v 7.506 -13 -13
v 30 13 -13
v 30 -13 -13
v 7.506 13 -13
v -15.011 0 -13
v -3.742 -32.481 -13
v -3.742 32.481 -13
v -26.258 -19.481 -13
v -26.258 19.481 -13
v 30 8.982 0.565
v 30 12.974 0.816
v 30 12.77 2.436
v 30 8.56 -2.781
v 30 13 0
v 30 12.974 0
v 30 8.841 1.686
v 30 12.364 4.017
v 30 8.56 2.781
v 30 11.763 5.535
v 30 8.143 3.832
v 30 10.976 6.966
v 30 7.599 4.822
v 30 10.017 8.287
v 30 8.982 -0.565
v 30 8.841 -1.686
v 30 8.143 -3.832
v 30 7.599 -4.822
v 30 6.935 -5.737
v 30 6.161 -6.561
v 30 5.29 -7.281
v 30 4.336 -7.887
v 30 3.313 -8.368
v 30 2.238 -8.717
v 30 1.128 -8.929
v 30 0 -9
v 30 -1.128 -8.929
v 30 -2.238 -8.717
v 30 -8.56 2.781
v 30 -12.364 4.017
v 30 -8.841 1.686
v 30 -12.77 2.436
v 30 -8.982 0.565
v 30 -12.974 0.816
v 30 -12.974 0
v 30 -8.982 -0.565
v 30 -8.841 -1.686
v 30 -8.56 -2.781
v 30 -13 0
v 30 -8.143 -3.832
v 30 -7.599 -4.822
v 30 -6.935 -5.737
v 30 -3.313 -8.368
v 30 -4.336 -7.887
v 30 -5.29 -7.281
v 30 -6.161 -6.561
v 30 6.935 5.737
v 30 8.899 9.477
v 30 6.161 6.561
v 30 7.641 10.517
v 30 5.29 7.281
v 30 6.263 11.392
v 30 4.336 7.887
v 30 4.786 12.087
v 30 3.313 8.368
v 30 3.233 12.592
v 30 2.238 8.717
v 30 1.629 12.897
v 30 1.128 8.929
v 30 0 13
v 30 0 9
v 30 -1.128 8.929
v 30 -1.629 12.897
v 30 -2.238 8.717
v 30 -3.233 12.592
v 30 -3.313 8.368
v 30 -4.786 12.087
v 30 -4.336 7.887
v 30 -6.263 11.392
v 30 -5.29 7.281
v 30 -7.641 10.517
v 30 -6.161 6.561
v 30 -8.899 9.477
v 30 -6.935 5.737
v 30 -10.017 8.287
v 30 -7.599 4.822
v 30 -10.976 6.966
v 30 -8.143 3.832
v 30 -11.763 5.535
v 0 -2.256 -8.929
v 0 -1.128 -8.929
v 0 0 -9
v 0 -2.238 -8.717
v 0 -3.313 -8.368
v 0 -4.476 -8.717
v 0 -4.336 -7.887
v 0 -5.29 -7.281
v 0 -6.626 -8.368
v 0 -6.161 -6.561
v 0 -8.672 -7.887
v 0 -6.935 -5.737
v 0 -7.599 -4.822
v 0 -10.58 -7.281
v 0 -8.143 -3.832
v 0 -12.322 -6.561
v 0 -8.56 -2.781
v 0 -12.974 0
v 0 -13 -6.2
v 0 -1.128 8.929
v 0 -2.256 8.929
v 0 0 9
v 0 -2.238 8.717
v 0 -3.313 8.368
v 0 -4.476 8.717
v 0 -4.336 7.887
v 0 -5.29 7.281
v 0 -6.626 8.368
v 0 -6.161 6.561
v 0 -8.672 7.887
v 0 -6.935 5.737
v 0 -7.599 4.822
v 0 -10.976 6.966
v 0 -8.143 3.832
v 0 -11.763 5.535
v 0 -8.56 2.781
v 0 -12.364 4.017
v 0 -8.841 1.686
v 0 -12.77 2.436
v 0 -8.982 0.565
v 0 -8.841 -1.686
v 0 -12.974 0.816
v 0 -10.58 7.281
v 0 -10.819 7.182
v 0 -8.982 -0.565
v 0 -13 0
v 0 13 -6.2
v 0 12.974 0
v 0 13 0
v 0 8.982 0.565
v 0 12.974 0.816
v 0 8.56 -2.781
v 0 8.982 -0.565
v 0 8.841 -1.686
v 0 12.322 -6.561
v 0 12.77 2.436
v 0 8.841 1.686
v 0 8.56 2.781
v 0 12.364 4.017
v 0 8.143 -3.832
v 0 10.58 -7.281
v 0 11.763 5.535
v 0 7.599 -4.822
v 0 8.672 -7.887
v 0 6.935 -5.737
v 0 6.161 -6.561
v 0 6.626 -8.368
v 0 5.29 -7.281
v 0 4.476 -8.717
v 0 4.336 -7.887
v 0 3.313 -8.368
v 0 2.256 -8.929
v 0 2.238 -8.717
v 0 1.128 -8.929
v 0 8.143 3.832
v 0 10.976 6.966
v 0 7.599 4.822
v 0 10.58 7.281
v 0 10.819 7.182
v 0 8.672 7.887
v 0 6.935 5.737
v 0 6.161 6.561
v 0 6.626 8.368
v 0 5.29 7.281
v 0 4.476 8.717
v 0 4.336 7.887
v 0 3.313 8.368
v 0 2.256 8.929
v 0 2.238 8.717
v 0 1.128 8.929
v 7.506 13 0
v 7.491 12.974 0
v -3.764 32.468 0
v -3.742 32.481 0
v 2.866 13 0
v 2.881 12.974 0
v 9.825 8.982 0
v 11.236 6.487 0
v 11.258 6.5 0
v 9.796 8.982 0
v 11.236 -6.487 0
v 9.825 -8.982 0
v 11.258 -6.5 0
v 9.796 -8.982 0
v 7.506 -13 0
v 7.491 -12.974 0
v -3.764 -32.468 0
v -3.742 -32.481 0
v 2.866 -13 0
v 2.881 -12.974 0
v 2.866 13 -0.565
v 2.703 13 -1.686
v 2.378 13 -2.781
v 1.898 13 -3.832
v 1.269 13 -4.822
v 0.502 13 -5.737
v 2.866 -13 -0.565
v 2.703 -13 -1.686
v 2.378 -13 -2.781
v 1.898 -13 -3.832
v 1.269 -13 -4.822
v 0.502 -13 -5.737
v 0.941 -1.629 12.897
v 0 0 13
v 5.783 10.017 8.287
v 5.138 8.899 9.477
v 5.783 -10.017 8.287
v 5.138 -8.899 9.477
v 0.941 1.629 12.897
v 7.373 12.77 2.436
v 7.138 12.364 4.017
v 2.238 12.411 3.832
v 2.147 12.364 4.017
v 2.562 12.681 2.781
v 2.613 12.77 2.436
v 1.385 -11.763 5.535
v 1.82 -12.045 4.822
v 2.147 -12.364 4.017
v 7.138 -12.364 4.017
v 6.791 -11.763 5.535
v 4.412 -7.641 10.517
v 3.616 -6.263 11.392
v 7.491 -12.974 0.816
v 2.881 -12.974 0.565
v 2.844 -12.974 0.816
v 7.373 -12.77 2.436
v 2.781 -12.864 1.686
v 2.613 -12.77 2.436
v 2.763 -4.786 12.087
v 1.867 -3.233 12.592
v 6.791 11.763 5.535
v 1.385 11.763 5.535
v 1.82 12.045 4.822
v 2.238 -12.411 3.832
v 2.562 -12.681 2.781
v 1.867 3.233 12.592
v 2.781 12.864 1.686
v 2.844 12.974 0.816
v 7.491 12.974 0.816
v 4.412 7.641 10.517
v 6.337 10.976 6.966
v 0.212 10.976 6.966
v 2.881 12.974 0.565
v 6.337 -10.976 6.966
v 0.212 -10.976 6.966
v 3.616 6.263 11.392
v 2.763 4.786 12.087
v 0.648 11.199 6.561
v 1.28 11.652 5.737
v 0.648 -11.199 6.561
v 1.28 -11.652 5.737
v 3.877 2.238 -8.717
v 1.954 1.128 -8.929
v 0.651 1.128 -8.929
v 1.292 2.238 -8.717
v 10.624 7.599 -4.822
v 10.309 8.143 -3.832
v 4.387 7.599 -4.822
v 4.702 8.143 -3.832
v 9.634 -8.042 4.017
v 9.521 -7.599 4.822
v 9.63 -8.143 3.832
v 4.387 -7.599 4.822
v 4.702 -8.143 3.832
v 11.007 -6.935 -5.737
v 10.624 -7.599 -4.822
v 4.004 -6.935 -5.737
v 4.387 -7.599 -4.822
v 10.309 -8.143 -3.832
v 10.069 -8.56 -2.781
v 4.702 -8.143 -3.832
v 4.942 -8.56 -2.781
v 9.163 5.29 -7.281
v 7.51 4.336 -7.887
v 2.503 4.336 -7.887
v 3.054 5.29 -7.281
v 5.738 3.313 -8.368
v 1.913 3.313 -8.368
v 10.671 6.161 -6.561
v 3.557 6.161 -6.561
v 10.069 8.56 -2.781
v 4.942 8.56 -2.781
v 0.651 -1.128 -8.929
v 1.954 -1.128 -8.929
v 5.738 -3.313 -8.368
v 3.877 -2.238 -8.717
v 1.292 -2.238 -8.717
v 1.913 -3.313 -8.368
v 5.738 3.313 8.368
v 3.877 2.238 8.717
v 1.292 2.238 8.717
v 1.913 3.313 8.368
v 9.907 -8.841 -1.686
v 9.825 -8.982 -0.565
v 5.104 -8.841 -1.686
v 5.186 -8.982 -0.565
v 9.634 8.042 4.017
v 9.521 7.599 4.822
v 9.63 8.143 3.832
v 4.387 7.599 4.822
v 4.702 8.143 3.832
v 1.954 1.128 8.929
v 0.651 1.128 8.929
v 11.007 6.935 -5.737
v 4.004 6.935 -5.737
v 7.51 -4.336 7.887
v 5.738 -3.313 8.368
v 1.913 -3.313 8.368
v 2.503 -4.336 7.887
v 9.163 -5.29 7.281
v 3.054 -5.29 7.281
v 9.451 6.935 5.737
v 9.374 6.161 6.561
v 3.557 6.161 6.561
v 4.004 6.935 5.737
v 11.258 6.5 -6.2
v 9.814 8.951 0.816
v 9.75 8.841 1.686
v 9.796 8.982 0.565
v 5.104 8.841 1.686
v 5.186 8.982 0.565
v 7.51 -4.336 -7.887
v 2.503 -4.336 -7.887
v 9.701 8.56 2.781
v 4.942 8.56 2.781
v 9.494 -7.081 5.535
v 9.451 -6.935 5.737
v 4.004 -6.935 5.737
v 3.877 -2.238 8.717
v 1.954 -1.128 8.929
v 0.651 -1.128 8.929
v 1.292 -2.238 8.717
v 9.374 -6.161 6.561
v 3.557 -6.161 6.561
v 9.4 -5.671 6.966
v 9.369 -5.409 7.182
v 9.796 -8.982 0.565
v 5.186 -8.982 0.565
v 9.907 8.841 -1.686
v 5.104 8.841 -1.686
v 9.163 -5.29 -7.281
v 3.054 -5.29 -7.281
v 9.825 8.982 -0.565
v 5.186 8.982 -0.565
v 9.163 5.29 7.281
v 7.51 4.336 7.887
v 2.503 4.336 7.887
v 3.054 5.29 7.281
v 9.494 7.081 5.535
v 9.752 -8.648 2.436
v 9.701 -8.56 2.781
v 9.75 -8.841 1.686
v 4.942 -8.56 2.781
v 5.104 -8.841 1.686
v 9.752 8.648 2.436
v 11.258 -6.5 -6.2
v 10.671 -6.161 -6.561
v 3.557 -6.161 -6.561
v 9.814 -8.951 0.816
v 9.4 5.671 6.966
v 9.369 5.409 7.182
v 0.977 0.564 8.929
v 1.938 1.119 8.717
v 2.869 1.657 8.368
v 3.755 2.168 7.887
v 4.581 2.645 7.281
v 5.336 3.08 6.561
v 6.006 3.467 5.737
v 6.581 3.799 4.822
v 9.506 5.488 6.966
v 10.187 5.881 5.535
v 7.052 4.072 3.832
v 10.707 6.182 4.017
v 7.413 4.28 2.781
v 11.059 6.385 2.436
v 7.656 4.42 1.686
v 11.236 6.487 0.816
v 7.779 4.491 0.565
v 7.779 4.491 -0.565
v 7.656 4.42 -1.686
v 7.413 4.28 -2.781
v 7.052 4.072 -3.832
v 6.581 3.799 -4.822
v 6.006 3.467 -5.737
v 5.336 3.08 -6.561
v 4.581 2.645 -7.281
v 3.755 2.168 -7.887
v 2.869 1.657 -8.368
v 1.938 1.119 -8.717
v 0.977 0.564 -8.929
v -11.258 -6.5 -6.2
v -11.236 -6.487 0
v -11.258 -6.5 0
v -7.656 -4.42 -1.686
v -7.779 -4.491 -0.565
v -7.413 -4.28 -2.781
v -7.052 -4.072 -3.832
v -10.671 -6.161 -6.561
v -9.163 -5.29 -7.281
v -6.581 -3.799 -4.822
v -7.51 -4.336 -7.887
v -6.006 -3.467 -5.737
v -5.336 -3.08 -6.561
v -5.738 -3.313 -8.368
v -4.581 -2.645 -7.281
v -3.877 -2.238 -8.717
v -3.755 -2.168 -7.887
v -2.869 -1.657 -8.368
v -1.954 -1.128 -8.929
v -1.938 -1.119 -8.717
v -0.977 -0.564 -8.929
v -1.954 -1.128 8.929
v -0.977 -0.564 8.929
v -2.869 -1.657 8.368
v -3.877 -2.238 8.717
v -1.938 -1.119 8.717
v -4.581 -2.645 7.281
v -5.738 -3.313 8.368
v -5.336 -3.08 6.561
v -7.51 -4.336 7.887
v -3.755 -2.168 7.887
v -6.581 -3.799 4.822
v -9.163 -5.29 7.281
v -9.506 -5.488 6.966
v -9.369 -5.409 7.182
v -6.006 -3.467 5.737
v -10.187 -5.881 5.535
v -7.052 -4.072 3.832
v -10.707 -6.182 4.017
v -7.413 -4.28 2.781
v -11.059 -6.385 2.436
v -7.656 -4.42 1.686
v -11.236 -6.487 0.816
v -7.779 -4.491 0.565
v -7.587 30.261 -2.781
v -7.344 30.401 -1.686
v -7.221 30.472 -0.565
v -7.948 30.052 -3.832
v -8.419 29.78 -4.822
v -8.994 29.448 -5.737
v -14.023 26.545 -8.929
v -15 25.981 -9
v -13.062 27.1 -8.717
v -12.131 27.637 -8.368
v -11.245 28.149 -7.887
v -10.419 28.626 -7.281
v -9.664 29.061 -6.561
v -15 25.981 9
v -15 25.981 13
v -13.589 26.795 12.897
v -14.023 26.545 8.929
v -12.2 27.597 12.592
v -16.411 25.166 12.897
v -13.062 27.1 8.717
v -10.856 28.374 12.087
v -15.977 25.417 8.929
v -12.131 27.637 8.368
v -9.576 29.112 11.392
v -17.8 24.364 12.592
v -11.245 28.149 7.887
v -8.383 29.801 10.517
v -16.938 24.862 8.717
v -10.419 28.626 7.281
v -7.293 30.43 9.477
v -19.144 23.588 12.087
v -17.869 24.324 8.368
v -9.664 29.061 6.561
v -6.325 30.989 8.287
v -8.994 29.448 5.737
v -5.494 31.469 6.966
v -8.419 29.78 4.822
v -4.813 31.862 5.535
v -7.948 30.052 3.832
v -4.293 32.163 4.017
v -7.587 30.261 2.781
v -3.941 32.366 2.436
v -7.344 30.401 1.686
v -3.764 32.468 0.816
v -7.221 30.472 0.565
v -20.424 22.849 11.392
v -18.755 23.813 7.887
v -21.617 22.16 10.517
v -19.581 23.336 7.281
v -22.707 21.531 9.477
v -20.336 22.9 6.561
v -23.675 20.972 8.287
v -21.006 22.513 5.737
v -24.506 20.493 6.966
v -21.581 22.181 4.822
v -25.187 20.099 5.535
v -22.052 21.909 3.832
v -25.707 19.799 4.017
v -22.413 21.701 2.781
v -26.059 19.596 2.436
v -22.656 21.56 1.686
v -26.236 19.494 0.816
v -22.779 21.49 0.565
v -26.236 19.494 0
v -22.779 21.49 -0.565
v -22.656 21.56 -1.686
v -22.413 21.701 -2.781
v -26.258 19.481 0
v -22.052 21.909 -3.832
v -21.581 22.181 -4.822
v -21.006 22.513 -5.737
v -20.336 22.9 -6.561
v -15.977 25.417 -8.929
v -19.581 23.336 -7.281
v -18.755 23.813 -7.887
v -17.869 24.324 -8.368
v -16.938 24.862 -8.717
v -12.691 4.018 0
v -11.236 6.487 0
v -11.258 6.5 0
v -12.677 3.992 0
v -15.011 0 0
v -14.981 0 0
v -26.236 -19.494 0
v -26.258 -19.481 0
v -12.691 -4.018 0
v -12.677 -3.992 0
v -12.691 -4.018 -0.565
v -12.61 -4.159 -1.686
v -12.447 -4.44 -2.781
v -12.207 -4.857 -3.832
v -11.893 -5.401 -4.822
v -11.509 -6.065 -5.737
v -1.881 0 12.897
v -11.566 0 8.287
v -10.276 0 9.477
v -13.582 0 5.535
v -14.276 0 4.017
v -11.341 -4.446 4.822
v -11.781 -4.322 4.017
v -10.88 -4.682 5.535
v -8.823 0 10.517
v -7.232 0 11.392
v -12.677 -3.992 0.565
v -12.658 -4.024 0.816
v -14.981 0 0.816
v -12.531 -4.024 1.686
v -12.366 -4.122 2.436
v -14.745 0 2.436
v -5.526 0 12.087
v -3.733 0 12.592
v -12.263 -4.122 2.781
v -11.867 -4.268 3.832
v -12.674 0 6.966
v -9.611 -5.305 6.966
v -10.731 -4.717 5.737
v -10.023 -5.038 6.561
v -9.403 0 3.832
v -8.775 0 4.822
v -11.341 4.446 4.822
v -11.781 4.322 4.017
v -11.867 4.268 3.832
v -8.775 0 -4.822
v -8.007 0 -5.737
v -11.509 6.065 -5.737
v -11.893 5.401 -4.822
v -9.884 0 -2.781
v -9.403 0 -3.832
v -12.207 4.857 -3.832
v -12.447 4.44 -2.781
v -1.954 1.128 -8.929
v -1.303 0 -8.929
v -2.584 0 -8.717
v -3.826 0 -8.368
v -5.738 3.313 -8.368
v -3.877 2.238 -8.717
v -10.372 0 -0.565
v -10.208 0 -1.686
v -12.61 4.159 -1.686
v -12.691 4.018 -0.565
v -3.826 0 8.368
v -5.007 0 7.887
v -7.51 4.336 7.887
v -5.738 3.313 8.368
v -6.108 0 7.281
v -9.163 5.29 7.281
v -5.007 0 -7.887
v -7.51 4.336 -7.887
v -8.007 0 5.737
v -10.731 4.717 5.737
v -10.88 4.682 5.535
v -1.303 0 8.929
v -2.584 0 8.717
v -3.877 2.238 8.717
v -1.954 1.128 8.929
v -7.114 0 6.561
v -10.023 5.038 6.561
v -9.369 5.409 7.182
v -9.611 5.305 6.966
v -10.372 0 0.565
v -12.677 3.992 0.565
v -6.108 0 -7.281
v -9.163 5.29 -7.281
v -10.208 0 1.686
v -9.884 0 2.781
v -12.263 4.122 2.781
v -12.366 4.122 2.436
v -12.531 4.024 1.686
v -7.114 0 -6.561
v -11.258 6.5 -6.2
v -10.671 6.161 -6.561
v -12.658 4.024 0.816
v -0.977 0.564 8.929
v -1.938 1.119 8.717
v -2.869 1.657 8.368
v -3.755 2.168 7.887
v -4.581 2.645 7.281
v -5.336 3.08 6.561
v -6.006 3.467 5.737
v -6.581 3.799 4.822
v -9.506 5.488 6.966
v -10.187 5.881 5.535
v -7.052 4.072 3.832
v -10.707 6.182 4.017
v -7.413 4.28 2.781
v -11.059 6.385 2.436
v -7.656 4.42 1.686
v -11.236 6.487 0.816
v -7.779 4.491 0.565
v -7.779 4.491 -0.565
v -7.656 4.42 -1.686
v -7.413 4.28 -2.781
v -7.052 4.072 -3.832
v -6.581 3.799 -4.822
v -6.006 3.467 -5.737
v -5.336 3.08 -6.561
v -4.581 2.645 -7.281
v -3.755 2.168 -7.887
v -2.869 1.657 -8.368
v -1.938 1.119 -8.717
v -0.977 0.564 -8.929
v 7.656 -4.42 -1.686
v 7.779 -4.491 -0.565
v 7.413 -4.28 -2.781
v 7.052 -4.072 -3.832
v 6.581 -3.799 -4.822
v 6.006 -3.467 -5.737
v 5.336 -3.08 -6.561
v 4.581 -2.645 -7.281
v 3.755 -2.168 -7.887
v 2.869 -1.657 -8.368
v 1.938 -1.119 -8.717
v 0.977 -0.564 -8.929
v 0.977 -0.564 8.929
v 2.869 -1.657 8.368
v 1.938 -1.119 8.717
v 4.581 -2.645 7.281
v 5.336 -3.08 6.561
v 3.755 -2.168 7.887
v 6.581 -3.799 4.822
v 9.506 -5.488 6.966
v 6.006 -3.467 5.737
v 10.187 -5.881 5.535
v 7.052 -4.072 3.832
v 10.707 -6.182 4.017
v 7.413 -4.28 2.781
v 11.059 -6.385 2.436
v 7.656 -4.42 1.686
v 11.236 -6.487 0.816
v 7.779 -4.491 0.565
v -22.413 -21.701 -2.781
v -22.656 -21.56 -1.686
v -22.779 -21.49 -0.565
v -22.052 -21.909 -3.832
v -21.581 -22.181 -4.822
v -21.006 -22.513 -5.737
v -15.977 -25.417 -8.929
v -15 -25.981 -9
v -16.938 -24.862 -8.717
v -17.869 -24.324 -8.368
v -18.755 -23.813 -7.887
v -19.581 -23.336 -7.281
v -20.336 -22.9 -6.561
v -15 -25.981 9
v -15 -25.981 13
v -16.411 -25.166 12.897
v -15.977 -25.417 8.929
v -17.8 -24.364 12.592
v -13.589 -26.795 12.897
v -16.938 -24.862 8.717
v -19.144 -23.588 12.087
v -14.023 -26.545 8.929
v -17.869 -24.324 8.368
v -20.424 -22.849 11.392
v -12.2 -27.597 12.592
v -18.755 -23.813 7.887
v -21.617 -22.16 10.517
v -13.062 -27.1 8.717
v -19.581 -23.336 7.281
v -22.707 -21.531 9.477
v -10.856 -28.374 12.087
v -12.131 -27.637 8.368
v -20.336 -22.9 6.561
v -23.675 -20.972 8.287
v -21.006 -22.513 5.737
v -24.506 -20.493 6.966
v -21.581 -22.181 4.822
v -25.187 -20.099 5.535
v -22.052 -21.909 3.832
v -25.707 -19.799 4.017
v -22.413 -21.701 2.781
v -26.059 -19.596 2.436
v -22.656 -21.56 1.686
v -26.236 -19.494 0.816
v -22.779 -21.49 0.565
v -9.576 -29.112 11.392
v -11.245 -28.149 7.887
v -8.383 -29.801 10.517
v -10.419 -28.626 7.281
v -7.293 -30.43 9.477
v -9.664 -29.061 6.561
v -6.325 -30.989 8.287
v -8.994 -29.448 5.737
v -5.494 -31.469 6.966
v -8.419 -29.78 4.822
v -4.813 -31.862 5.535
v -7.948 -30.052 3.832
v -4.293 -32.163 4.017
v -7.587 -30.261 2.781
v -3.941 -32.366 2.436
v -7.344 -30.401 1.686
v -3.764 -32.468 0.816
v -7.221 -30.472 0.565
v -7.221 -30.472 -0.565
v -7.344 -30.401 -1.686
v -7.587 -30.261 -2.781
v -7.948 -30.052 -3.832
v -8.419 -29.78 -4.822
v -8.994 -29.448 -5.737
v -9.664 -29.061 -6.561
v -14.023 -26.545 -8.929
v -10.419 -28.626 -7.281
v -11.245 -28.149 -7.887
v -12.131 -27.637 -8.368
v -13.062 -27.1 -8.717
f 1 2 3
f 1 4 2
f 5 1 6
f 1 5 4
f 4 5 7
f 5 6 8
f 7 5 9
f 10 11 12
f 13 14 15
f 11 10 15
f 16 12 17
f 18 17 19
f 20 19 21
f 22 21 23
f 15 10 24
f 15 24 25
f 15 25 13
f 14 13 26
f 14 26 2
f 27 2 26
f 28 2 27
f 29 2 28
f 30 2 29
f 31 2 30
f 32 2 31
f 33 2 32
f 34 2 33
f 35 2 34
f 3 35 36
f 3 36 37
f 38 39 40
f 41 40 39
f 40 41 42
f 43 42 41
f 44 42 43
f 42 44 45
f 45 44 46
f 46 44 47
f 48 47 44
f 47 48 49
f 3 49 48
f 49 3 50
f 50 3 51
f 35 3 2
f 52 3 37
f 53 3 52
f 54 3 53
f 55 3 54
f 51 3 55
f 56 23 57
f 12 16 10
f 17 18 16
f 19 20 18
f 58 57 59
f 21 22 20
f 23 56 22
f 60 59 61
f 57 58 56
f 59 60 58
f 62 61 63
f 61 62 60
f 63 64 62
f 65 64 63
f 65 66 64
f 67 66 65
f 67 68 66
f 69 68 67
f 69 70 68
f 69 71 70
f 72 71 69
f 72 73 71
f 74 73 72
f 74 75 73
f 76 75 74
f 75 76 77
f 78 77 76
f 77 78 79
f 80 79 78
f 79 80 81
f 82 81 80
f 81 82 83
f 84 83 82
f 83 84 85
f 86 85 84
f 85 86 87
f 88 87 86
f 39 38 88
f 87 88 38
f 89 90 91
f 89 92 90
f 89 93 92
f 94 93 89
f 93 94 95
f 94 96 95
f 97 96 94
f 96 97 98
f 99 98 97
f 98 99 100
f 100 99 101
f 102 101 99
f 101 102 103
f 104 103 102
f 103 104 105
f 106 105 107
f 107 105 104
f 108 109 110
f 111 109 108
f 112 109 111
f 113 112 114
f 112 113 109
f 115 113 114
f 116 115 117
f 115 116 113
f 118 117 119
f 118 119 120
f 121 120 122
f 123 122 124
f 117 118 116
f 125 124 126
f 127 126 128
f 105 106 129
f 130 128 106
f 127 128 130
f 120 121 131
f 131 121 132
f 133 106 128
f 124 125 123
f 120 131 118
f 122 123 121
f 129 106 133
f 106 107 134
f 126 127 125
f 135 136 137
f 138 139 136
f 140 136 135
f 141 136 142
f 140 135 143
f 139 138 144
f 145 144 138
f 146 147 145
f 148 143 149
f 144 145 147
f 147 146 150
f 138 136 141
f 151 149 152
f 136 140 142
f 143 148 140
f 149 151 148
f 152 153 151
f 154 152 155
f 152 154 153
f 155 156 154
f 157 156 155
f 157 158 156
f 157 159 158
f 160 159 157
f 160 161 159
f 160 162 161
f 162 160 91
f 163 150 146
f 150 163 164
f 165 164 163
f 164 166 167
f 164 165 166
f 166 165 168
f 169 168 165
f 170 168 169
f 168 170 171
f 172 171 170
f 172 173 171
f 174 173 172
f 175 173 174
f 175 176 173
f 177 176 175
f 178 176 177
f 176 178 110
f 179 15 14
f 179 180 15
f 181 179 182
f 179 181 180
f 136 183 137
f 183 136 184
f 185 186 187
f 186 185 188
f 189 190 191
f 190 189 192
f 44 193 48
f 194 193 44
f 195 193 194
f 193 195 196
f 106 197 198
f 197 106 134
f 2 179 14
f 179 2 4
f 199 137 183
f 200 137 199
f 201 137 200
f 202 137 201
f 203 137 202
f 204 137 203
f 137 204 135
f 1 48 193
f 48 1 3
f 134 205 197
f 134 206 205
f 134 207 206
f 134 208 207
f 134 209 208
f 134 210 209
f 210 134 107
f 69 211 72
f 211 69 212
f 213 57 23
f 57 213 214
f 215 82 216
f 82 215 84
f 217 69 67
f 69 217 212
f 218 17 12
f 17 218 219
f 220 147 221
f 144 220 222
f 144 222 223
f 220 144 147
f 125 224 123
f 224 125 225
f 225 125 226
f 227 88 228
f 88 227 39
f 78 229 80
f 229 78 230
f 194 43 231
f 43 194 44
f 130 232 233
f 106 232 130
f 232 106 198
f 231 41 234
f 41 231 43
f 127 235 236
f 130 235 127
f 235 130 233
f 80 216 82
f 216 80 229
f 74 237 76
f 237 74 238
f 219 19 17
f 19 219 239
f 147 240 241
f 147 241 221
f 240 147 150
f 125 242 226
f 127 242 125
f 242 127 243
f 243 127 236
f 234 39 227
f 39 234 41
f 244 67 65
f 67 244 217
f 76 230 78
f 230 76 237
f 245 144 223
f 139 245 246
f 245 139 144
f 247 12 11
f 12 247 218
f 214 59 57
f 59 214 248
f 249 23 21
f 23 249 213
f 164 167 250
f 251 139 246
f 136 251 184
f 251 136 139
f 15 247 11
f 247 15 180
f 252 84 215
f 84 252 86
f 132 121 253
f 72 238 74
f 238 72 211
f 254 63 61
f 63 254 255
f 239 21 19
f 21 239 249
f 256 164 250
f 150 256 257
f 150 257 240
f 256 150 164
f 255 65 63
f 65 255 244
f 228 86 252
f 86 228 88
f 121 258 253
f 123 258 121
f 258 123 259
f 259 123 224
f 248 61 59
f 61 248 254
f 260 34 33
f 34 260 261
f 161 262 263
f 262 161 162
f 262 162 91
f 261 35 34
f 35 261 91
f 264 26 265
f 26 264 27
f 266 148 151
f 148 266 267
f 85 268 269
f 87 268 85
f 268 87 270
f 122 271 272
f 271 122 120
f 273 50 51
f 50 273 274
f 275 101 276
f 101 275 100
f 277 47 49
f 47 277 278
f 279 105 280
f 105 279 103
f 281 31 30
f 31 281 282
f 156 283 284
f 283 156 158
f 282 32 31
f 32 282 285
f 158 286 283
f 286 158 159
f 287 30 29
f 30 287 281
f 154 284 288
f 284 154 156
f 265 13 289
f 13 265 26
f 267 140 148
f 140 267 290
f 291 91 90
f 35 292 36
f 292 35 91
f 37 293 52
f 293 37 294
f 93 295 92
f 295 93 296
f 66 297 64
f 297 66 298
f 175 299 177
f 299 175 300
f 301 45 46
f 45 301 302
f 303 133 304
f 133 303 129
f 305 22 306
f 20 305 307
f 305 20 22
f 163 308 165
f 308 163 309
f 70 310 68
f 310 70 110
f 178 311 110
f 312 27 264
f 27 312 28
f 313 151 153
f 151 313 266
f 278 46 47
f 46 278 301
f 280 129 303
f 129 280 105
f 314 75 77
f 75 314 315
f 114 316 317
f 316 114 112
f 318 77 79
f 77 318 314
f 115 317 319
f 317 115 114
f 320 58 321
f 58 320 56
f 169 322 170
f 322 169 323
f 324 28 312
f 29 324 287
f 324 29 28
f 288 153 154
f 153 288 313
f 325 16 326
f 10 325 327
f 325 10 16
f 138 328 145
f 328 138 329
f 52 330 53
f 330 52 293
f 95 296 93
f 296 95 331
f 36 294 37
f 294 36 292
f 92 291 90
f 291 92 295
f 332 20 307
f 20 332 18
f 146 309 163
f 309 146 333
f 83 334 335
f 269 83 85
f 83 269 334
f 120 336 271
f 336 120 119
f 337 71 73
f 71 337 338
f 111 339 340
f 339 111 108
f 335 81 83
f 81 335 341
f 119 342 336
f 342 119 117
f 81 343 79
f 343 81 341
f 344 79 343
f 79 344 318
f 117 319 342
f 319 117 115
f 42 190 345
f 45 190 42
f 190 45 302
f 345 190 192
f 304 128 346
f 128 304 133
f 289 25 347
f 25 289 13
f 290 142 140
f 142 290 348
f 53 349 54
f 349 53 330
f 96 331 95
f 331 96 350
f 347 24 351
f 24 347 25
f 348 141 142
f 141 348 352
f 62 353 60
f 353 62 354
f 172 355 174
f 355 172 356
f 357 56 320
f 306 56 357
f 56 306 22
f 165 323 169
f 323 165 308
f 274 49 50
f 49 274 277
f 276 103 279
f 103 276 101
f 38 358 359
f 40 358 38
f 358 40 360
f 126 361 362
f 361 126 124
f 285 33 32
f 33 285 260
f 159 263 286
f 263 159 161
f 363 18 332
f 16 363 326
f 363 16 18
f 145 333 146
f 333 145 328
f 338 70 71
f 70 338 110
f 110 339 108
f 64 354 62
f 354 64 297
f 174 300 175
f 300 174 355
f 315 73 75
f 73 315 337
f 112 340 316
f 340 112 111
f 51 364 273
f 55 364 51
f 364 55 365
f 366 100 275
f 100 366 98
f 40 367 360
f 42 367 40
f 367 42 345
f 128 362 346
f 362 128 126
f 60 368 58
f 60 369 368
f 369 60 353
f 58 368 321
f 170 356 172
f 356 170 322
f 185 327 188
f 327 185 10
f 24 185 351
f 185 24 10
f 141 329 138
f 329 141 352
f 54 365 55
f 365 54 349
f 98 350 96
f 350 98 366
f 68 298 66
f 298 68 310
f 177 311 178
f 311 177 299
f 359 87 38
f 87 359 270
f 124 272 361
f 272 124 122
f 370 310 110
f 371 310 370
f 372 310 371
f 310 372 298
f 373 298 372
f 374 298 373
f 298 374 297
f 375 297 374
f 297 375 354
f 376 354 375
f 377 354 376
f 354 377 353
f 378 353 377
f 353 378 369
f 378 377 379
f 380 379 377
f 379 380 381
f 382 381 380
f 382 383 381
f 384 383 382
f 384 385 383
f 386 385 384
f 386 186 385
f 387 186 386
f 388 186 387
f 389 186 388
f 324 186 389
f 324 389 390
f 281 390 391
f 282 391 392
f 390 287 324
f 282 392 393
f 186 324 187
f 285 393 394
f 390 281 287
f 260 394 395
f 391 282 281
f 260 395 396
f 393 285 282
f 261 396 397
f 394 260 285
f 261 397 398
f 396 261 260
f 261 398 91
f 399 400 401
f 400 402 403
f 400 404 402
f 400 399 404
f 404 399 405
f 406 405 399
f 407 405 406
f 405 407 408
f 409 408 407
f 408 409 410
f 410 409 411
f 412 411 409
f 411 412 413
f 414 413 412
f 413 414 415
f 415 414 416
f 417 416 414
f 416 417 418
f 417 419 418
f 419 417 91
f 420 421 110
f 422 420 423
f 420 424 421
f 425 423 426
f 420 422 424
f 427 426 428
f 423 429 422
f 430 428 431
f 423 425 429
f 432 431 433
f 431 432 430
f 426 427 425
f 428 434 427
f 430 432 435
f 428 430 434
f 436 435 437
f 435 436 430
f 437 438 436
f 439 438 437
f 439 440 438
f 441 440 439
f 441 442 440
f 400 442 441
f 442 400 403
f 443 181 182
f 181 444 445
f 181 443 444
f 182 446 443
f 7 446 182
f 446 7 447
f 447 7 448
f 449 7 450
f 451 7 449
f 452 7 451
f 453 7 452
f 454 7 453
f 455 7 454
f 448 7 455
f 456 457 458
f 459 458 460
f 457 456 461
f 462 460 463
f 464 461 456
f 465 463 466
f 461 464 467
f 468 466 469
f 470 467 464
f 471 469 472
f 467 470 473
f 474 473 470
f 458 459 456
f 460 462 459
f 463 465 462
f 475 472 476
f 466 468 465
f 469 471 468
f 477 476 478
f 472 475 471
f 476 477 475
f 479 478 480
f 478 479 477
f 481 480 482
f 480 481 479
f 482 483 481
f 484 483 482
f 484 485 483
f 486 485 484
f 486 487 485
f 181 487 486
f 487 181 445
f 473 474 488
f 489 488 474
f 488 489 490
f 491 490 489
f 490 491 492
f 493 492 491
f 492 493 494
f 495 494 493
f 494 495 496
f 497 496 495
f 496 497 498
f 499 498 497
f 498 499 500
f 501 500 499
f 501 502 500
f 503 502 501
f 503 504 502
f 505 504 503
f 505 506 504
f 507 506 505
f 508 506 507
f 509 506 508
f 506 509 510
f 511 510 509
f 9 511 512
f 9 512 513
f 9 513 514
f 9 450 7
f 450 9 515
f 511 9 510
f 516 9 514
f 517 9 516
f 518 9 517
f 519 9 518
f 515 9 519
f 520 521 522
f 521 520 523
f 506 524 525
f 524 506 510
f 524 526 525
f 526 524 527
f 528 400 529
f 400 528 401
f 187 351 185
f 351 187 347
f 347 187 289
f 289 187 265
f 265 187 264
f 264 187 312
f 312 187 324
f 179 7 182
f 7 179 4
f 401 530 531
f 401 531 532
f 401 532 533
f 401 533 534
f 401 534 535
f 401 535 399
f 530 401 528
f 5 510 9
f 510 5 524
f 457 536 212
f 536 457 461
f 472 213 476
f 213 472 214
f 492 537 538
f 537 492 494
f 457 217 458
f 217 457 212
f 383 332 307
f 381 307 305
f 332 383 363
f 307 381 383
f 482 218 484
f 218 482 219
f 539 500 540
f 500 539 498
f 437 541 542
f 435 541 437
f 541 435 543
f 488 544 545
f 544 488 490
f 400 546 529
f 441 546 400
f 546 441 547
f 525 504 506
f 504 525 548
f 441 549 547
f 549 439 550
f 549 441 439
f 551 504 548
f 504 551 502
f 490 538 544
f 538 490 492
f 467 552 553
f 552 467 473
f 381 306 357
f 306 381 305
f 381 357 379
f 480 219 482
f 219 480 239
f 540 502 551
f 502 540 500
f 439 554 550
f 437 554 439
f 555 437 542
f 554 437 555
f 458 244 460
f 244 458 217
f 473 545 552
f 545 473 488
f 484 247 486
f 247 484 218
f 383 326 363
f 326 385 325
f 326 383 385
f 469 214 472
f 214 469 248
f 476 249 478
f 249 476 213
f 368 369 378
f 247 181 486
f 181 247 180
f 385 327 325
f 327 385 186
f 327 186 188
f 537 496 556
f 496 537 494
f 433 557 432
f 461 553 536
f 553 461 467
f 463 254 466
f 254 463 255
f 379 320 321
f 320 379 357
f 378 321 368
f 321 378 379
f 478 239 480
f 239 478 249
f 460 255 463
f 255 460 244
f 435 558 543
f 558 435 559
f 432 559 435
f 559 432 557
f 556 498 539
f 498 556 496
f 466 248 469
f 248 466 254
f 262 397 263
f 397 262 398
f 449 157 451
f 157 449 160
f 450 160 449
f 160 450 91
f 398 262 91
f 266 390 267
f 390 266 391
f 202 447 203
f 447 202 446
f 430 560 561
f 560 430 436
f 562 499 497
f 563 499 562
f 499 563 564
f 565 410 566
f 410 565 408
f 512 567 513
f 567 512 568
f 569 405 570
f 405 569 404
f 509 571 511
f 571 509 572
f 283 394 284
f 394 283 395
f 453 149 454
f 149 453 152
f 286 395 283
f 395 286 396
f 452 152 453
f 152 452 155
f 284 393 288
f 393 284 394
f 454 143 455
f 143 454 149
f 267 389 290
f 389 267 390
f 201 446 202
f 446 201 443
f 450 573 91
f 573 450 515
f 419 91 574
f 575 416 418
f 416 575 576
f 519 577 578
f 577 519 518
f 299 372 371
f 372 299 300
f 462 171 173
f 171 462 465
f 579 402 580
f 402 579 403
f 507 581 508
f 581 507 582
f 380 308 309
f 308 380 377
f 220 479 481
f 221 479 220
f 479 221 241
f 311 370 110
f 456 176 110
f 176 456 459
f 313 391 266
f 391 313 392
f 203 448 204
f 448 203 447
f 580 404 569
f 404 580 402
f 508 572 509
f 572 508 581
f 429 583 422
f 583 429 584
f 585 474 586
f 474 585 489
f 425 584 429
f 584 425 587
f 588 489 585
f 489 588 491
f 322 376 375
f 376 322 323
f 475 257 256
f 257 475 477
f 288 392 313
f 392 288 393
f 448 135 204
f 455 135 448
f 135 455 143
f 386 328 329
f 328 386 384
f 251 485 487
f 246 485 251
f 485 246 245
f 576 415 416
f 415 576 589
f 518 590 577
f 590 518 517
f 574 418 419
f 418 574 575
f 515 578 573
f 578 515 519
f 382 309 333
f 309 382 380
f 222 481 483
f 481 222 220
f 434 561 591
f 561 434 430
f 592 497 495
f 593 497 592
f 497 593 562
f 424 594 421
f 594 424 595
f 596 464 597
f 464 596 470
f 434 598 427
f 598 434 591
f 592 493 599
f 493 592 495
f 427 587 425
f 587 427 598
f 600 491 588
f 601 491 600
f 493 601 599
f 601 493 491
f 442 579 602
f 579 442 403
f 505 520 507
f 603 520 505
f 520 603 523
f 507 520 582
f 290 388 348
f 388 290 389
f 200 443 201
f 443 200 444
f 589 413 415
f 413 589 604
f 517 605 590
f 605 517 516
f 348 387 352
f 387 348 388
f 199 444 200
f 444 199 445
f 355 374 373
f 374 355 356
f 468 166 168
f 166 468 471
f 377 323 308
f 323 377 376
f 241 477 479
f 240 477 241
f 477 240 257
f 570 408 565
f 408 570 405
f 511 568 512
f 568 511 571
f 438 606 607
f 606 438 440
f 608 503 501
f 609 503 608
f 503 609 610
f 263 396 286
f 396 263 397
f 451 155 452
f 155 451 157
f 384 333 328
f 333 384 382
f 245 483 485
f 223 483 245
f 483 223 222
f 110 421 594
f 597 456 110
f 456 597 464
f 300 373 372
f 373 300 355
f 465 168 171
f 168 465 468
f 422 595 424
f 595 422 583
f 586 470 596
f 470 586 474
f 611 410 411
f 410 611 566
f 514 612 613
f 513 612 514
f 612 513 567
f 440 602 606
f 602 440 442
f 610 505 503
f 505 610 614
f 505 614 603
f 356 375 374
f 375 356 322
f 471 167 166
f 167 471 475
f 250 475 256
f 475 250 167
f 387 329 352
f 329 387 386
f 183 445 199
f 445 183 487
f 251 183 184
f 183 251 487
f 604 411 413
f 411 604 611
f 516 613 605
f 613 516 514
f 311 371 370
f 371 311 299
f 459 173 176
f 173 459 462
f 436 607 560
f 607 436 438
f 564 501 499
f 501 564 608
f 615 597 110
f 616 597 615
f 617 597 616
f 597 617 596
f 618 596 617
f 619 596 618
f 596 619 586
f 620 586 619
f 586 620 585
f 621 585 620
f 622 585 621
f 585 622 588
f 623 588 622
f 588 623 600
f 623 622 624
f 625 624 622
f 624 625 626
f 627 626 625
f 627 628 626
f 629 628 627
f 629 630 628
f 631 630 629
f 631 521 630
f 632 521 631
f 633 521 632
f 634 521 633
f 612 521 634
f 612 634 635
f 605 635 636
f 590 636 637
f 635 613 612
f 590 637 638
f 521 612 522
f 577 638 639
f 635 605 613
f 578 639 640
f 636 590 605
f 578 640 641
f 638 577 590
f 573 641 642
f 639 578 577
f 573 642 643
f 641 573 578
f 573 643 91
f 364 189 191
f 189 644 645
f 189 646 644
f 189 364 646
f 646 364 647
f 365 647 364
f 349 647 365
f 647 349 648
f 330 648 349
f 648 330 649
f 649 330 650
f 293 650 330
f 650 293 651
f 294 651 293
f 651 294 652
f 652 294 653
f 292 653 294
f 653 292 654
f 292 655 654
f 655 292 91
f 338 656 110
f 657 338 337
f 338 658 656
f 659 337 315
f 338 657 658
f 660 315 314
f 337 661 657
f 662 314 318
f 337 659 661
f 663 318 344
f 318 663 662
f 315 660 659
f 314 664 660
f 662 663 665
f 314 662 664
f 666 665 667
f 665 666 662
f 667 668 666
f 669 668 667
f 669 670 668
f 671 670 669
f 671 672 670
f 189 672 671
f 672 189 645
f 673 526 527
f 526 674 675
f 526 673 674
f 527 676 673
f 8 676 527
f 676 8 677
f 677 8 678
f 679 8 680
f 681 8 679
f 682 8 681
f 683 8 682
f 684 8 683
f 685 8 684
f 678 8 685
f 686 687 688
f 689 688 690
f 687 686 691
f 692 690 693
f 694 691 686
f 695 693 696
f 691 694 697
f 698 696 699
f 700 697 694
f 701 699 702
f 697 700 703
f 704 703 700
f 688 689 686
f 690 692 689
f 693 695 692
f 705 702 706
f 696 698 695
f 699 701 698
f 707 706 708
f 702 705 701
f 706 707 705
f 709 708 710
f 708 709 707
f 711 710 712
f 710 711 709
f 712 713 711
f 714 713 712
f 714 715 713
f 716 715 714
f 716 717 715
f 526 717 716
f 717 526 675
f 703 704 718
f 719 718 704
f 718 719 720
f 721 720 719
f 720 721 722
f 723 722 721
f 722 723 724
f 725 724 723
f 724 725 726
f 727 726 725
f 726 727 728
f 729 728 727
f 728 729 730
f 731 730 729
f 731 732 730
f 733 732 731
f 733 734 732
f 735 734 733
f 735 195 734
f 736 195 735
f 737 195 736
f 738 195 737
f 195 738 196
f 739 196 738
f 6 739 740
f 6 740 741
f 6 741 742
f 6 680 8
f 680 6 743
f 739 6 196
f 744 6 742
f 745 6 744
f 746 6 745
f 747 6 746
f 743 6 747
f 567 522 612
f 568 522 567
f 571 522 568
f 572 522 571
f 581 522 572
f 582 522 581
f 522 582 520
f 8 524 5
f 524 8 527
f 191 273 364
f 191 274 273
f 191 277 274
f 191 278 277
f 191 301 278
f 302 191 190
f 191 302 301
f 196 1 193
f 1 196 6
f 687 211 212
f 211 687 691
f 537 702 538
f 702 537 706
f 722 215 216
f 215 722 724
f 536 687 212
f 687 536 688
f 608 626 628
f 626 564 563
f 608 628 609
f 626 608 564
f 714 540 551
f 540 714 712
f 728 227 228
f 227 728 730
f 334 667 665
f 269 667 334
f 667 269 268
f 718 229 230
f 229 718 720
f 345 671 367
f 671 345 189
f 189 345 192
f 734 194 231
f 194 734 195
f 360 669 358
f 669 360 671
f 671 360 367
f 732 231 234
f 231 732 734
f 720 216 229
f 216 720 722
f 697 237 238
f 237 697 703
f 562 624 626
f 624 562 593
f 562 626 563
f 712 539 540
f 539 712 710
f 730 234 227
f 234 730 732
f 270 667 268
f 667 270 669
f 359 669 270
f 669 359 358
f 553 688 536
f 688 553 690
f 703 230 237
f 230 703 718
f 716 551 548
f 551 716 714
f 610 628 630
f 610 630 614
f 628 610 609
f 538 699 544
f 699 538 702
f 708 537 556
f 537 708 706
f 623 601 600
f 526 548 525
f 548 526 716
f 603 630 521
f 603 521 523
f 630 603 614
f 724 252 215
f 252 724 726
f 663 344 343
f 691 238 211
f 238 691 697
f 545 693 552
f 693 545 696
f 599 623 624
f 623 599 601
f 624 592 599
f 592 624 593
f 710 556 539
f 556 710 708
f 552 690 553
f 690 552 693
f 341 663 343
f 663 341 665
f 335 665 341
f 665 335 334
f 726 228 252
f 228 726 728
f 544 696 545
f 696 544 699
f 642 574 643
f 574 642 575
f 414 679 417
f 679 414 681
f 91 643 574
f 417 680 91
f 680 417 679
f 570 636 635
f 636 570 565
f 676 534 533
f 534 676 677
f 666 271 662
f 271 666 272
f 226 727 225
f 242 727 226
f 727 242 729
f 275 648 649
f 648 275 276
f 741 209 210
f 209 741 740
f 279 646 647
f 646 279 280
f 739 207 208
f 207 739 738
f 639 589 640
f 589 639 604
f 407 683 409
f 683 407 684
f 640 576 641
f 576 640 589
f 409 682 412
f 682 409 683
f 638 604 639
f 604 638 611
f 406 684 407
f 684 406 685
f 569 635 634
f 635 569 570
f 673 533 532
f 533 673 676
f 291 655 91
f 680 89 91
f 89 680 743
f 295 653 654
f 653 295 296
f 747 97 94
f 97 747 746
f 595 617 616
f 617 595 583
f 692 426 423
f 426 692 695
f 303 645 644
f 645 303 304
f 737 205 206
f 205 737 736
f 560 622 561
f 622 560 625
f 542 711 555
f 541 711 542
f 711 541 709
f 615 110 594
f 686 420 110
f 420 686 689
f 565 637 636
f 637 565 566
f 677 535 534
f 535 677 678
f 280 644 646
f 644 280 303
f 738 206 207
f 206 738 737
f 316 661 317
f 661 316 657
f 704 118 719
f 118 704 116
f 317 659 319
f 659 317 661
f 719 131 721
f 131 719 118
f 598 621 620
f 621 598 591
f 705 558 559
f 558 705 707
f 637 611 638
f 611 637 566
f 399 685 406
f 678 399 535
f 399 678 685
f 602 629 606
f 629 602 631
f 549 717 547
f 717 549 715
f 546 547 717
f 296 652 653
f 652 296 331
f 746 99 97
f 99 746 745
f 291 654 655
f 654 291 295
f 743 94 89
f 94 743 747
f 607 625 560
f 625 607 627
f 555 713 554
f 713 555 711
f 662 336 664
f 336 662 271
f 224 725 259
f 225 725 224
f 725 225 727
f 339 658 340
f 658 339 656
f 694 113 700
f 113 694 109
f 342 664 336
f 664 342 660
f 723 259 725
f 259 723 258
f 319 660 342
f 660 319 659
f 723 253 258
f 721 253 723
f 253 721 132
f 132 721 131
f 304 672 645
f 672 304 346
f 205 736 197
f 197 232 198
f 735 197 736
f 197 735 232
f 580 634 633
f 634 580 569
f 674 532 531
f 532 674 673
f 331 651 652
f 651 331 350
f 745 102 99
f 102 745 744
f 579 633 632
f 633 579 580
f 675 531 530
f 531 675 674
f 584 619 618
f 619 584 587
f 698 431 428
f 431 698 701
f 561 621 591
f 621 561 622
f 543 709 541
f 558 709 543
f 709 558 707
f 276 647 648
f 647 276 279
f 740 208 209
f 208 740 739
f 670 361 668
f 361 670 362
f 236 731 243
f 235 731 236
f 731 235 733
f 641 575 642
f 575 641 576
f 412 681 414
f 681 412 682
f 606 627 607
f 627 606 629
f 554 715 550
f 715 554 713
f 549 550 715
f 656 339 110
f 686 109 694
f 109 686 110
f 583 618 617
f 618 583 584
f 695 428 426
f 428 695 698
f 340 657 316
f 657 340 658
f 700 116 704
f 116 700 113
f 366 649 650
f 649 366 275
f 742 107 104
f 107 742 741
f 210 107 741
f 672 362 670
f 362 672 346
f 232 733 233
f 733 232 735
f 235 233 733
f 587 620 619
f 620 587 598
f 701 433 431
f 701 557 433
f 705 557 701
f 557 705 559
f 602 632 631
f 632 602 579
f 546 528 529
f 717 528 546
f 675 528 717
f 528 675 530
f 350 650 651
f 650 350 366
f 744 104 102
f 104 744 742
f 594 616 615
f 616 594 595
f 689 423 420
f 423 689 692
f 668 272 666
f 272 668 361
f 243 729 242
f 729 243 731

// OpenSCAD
//Helical yagi Y mount
//by cshields

pvc_width=18;
wall_width=8;

$fn=50;

length=30;

module holder(pvc, wall, len) {
	total_diameter = pvc+wall;
	difference() {
		union() {
			translate([total_diameter/4,0,0])
				cube([total_diameter/2,total_diameter,len],center=true);
			cylinder(d=total_diameter,h=len,center=true);
		}
		cylinder(d=pvc,h=len+2,center=true);
	}
}

union() {
	rotate(90,[0,1,0])
		translate([0,0,length/2])
		holder(pvc_width, wall_width, length);
	rotate([60,90,0])
		translate([0,0,-1*(length/2)])
		holder(pvc_width, wall_width, length);
	rotate([-60,90,0])
		translate([0,0,-1*(length/2)])
		holder(pvc_width, wall_width, length);
}
